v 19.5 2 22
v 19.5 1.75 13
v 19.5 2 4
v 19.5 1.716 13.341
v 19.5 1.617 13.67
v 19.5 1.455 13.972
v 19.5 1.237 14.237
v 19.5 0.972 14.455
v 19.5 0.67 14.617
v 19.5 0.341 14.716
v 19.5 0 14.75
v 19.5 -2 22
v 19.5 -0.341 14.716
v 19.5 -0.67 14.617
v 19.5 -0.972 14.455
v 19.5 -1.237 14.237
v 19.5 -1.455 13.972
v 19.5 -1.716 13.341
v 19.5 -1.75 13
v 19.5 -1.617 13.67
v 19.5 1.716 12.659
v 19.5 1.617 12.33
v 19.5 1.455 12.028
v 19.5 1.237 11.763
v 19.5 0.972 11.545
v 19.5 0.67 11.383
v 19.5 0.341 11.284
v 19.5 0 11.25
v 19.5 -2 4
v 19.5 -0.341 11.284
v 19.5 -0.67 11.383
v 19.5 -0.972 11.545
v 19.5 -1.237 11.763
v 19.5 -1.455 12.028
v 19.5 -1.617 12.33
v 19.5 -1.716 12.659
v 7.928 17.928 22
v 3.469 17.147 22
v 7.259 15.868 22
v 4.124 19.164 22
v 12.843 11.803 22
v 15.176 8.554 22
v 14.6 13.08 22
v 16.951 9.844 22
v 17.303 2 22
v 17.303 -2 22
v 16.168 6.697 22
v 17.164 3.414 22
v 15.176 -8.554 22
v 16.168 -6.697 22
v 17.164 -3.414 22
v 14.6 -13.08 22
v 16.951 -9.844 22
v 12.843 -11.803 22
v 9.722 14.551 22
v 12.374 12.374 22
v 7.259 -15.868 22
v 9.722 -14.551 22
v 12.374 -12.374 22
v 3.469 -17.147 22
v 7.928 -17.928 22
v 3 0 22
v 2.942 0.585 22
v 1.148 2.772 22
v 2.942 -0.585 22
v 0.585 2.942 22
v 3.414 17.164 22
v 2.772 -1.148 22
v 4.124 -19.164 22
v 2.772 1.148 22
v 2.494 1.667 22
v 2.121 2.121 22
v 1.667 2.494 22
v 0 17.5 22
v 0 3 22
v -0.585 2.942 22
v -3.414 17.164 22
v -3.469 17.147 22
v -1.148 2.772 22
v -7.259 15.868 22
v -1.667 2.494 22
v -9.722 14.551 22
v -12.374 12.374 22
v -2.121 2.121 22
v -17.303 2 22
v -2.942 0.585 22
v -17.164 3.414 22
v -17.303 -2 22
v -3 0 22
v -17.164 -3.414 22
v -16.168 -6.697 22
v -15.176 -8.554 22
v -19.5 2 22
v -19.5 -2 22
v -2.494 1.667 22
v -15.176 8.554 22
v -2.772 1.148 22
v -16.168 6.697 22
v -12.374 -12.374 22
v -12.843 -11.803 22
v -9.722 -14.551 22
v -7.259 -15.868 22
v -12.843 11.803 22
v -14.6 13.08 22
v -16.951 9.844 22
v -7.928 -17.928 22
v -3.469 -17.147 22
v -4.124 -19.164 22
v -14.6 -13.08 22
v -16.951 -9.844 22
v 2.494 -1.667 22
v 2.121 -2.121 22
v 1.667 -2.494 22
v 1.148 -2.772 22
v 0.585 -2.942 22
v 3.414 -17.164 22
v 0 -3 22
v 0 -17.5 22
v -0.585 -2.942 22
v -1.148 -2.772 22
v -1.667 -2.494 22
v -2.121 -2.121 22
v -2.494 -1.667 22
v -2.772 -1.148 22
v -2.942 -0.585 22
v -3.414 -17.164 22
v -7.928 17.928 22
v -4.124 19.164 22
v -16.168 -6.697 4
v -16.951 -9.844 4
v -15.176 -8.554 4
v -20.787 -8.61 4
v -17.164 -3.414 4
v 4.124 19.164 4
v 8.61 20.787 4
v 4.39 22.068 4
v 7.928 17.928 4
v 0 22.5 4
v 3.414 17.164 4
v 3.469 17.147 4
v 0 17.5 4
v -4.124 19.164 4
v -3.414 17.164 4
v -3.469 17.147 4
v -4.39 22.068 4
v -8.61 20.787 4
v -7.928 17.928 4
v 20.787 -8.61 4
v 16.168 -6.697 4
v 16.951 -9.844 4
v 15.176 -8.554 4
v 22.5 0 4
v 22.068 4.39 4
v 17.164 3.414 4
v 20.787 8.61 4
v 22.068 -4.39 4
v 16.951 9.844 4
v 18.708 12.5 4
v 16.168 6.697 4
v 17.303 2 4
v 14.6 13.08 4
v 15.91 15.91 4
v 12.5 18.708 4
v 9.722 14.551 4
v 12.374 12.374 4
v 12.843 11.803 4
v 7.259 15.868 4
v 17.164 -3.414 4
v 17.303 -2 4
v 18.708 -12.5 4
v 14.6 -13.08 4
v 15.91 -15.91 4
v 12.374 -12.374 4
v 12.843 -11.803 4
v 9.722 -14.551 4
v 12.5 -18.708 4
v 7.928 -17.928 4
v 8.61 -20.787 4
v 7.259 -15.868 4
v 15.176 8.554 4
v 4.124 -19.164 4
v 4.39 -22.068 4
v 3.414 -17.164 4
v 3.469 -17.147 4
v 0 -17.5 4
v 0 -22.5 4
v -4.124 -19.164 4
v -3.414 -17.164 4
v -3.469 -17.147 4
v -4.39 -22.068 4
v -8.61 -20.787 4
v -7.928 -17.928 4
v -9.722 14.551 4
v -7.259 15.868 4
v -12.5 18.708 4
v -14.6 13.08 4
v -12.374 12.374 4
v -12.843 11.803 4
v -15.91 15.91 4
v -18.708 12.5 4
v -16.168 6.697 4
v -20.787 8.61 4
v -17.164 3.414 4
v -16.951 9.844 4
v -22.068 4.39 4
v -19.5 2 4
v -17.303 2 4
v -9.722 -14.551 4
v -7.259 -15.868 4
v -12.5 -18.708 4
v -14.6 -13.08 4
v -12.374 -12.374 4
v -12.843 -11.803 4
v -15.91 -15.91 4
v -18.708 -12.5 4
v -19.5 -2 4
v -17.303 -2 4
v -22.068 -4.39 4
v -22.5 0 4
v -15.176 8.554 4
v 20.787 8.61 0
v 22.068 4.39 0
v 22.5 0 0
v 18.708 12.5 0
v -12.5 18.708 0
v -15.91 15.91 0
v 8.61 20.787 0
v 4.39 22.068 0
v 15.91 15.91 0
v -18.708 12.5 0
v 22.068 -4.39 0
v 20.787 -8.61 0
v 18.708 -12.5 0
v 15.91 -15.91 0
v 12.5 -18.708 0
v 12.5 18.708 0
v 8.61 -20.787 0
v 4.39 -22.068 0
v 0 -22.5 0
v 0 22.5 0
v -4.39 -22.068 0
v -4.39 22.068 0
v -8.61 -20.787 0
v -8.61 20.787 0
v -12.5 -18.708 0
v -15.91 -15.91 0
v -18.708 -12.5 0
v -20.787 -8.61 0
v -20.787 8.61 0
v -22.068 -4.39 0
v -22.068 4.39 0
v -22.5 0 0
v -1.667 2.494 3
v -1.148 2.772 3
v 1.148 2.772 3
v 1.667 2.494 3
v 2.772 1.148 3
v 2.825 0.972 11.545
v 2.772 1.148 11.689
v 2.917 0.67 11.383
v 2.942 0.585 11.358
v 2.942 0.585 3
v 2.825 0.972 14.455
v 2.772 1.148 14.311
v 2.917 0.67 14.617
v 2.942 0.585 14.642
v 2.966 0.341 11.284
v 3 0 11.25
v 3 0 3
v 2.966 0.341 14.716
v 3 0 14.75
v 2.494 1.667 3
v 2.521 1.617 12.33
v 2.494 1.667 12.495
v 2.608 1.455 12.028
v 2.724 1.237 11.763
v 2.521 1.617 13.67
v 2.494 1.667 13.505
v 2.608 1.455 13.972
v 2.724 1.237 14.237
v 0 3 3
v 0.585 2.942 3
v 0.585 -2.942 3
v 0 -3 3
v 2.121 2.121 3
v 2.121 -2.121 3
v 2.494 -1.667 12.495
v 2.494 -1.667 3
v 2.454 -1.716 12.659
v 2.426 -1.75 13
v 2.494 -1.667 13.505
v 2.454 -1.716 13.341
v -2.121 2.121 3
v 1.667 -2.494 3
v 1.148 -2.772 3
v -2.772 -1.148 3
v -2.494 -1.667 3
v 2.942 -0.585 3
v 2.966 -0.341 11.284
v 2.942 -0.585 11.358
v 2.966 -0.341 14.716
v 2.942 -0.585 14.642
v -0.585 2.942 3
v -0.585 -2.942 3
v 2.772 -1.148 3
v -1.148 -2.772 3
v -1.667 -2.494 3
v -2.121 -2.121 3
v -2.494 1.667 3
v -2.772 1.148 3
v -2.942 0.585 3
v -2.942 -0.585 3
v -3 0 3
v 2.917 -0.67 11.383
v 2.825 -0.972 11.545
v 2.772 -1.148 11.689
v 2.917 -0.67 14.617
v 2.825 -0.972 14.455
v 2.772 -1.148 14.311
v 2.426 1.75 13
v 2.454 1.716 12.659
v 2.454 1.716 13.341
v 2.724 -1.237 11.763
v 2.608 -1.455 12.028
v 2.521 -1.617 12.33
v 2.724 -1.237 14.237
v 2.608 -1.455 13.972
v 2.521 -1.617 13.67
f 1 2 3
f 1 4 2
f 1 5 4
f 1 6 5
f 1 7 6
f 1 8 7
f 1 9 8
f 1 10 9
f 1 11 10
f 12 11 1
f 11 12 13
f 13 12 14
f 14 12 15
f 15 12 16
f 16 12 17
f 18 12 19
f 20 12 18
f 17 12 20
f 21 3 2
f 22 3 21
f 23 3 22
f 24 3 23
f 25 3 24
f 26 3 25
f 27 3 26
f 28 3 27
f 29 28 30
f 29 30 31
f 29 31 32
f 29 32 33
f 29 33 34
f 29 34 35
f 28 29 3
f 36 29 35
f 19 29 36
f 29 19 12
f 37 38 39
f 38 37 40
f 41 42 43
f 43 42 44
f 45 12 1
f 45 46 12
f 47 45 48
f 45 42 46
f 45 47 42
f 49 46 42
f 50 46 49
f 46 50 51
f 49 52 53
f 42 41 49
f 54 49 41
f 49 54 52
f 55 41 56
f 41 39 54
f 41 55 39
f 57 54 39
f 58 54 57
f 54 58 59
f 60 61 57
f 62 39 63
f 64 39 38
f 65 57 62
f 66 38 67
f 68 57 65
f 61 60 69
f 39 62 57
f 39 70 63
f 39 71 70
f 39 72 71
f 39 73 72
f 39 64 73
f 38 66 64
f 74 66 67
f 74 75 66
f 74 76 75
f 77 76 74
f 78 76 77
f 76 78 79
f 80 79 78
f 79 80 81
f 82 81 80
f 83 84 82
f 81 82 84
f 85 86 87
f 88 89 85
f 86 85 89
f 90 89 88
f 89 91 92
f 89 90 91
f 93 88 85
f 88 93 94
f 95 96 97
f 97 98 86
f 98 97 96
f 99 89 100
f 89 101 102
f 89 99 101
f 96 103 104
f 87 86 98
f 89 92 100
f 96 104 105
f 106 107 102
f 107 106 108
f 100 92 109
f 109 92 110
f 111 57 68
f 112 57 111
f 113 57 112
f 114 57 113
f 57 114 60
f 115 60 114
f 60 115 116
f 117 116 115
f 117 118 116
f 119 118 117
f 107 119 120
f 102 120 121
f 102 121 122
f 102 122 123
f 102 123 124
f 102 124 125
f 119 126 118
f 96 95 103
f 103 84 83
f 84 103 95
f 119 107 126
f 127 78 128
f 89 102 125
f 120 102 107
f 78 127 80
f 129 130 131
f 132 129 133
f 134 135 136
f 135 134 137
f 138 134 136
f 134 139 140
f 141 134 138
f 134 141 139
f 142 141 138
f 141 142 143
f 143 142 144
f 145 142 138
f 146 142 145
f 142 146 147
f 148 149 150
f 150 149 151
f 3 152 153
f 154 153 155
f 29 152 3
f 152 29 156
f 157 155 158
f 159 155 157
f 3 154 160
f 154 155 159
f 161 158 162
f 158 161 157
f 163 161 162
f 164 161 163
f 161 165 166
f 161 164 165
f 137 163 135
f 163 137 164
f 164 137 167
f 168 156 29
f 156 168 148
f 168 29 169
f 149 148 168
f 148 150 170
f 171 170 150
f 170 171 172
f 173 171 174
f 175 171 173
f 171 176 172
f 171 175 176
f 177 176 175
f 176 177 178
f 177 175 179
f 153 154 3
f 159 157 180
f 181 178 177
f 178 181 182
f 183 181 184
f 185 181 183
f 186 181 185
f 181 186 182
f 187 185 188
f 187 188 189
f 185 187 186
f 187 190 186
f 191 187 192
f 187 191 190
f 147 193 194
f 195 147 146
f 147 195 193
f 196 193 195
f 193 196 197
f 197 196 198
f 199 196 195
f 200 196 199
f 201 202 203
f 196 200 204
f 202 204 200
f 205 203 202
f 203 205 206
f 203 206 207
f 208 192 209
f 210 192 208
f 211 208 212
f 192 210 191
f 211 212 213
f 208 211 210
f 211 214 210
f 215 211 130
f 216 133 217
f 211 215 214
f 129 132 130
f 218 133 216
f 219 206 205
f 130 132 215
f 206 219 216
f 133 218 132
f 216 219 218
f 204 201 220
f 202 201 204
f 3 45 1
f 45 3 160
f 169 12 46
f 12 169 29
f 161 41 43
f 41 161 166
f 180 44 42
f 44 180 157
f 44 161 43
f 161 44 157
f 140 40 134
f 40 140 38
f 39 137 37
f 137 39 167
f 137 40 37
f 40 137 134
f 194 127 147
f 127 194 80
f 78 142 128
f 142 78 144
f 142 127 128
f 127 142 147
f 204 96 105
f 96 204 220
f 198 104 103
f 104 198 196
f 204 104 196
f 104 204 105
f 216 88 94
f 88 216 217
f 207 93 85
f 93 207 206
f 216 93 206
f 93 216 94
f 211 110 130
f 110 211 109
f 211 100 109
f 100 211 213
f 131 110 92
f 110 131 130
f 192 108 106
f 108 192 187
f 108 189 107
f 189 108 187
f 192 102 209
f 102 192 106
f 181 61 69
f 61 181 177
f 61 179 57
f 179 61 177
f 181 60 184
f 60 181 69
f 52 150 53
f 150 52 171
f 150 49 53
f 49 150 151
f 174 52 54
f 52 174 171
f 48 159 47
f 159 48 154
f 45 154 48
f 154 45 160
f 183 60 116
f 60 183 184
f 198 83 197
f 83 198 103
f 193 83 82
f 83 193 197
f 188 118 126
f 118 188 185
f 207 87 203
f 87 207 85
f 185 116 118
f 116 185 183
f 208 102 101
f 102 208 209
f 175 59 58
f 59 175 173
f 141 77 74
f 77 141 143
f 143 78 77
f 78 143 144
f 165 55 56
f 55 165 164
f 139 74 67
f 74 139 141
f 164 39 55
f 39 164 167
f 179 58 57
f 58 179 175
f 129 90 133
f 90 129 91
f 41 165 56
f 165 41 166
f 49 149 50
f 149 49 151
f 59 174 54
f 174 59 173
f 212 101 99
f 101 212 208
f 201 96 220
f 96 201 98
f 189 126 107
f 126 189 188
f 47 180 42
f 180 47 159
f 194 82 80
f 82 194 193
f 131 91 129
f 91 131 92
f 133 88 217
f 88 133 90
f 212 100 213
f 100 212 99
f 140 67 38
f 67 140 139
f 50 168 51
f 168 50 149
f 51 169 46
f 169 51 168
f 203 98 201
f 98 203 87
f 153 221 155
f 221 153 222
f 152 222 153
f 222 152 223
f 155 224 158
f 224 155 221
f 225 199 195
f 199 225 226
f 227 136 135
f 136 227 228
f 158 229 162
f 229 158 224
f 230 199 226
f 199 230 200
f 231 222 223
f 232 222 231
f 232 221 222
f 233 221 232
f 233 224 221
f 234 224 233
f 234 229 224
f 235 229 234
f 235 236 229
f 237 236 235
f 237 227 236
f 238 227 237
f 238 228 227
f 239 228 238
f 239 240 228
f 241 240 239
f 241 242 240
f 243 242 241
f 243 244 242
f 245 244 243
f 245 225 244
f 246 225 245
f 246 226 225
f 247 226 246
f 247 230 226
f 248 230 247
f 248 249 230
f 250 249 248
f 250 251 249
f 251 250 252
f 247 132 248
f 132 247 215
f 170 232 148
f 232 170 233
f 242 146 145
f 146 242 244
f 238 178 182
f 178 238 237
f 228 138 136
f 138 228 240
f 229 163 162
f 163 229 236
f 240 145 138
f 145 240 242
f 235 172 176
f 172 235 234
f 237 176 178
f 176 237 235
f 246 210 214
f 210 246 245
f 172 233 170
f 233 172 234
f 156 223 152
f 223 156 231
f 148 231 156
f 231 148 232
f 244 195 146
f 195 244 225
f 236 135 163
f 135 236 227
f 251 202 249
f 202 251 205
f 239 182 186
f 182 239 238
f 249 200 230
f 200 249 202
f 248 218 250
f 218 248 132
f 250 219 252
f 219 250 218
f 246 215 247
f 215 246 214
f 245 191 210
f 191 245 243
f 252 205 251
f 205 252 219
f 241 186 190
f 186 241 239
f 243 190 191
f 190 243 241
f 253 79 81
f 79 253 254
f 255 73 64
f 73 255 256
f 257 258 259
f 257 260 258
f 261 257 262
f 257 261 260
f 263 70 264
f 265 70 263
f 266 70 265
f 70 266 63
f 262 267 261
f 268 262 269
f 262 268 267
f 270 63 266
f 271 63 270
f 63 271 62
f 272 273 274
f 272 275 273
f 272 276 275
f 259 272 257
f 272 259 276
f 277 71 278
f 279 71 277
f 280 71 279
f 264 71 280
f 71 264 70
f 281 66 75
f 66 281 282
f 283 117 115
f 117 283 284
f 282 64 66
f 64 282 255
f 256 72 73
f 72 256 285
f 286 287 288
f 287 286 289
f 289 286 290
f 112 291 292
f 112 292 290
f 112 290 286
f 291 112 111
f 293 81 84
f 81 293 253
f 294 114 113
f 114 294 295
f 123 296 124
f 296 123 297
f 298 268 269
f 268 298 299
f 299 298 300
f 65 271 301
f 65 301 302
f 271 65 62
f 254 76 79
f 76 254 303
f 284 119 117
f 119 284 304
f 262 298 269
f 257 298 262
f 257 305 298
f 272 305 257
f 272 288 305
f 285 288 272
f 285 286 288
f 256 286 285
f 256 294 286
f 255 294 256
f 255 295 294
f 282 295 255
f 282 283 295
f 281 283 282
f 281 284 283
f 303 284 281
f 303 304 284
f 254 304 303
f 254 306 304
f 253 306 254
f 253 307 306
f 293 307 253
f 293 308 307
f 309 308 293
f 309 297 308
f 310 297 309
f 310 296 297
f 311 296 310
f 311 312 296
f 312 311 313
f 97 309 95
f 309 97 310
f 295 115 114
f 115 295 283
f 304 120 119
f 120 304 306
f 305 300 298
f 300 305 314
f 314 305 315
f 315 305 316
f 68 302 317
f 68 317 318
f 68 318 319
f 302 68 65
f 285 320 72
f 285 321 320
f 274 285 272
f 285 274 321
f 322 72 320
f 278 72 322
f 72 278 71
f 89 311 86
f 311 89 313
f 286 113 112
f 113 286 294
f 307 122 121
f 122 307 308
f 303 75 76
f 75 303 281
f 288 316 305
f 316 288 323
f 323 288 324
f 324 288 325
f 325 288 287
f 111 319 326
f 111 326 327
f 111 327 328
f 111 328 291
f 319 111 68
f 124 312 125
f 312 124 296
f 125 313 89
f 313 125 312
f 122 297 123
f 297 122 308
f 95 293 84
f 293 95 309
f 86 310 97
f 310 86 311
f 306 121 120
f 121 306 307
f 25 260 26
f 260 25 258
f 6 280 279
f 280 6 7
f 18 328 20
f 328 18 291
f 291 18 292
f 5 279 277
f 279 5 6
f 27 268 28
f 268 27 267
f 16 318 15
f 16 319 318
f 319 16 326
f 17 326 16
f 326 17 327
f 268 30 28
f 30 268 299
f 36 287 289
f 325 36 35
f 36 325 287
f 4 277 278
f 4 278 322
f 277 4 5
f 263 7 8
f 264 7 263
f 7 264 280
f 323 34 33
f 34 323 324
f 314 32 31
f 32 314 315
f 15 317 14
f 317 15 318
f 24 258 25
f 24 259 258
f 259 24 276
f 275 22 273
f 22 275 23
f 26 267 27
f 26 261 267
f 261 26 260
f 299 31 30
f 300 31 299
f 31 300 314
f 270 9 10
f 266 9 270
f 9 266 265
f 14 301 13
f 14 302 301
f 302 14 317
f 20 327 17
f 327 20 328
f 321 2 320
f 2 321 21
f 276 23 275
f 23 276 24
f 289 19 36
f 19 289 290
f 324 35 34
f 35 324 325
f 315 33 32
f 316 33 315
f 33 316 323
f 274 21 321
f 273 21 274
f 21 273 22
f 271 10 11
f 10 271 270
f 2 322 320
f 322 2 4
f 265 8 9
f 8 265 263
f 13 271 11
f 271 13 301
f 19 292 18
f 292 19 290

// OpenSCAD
$fn = 32;

// ----------------------------------------------------------------------
// Control knob: skirt knob with grip ribs
// ----------------------------------------------------------------------

// --- parameters (mm) ---
skirt_d = 45;             // skirt diameter
skirt_t = 4;              // skirt thickness
rib_w = 4;                // grip rib width
rib_out = 3;              // grip rib radial protrusion
n_ribs = 10;              // number of grip ribs
knob_d = 35;              // knob body diameter
knob_h = 18;              // knob body height
bore_d = 6;               // shaft bore diameter
set_d = 3.5;              // set screw bore diameter

rib_step = 360 / n_ribs;  // rib angular step
total_h = skirt_t + knob_h;  // overall height

difference() {
  union() {
    translate([0, 0, skirt_t]) cylinder(h = knob_h, d = knob_d);
    cylinder(h = skirt_t, d = skirt_d);
    for (i = [0 : n_ribs - 1])
      rotate([0, 0, i * rib_step])
        translate([knob_d / 2 - 1, -rib_w / 2, skirt_t])
          cube([rib_out, rib_w, knob_h]);
  }
  translate([0, 0, skirt_t - 1]) cylinder(h = knob_h + 2, d = bore_d);
  translate([-1, 0, skirt_t + knob_h / 2]) rotate([0, 90, 0])
    cylinder(h = knob_d / 2 + bore_d / 2 + 2, d = set_d);
}
